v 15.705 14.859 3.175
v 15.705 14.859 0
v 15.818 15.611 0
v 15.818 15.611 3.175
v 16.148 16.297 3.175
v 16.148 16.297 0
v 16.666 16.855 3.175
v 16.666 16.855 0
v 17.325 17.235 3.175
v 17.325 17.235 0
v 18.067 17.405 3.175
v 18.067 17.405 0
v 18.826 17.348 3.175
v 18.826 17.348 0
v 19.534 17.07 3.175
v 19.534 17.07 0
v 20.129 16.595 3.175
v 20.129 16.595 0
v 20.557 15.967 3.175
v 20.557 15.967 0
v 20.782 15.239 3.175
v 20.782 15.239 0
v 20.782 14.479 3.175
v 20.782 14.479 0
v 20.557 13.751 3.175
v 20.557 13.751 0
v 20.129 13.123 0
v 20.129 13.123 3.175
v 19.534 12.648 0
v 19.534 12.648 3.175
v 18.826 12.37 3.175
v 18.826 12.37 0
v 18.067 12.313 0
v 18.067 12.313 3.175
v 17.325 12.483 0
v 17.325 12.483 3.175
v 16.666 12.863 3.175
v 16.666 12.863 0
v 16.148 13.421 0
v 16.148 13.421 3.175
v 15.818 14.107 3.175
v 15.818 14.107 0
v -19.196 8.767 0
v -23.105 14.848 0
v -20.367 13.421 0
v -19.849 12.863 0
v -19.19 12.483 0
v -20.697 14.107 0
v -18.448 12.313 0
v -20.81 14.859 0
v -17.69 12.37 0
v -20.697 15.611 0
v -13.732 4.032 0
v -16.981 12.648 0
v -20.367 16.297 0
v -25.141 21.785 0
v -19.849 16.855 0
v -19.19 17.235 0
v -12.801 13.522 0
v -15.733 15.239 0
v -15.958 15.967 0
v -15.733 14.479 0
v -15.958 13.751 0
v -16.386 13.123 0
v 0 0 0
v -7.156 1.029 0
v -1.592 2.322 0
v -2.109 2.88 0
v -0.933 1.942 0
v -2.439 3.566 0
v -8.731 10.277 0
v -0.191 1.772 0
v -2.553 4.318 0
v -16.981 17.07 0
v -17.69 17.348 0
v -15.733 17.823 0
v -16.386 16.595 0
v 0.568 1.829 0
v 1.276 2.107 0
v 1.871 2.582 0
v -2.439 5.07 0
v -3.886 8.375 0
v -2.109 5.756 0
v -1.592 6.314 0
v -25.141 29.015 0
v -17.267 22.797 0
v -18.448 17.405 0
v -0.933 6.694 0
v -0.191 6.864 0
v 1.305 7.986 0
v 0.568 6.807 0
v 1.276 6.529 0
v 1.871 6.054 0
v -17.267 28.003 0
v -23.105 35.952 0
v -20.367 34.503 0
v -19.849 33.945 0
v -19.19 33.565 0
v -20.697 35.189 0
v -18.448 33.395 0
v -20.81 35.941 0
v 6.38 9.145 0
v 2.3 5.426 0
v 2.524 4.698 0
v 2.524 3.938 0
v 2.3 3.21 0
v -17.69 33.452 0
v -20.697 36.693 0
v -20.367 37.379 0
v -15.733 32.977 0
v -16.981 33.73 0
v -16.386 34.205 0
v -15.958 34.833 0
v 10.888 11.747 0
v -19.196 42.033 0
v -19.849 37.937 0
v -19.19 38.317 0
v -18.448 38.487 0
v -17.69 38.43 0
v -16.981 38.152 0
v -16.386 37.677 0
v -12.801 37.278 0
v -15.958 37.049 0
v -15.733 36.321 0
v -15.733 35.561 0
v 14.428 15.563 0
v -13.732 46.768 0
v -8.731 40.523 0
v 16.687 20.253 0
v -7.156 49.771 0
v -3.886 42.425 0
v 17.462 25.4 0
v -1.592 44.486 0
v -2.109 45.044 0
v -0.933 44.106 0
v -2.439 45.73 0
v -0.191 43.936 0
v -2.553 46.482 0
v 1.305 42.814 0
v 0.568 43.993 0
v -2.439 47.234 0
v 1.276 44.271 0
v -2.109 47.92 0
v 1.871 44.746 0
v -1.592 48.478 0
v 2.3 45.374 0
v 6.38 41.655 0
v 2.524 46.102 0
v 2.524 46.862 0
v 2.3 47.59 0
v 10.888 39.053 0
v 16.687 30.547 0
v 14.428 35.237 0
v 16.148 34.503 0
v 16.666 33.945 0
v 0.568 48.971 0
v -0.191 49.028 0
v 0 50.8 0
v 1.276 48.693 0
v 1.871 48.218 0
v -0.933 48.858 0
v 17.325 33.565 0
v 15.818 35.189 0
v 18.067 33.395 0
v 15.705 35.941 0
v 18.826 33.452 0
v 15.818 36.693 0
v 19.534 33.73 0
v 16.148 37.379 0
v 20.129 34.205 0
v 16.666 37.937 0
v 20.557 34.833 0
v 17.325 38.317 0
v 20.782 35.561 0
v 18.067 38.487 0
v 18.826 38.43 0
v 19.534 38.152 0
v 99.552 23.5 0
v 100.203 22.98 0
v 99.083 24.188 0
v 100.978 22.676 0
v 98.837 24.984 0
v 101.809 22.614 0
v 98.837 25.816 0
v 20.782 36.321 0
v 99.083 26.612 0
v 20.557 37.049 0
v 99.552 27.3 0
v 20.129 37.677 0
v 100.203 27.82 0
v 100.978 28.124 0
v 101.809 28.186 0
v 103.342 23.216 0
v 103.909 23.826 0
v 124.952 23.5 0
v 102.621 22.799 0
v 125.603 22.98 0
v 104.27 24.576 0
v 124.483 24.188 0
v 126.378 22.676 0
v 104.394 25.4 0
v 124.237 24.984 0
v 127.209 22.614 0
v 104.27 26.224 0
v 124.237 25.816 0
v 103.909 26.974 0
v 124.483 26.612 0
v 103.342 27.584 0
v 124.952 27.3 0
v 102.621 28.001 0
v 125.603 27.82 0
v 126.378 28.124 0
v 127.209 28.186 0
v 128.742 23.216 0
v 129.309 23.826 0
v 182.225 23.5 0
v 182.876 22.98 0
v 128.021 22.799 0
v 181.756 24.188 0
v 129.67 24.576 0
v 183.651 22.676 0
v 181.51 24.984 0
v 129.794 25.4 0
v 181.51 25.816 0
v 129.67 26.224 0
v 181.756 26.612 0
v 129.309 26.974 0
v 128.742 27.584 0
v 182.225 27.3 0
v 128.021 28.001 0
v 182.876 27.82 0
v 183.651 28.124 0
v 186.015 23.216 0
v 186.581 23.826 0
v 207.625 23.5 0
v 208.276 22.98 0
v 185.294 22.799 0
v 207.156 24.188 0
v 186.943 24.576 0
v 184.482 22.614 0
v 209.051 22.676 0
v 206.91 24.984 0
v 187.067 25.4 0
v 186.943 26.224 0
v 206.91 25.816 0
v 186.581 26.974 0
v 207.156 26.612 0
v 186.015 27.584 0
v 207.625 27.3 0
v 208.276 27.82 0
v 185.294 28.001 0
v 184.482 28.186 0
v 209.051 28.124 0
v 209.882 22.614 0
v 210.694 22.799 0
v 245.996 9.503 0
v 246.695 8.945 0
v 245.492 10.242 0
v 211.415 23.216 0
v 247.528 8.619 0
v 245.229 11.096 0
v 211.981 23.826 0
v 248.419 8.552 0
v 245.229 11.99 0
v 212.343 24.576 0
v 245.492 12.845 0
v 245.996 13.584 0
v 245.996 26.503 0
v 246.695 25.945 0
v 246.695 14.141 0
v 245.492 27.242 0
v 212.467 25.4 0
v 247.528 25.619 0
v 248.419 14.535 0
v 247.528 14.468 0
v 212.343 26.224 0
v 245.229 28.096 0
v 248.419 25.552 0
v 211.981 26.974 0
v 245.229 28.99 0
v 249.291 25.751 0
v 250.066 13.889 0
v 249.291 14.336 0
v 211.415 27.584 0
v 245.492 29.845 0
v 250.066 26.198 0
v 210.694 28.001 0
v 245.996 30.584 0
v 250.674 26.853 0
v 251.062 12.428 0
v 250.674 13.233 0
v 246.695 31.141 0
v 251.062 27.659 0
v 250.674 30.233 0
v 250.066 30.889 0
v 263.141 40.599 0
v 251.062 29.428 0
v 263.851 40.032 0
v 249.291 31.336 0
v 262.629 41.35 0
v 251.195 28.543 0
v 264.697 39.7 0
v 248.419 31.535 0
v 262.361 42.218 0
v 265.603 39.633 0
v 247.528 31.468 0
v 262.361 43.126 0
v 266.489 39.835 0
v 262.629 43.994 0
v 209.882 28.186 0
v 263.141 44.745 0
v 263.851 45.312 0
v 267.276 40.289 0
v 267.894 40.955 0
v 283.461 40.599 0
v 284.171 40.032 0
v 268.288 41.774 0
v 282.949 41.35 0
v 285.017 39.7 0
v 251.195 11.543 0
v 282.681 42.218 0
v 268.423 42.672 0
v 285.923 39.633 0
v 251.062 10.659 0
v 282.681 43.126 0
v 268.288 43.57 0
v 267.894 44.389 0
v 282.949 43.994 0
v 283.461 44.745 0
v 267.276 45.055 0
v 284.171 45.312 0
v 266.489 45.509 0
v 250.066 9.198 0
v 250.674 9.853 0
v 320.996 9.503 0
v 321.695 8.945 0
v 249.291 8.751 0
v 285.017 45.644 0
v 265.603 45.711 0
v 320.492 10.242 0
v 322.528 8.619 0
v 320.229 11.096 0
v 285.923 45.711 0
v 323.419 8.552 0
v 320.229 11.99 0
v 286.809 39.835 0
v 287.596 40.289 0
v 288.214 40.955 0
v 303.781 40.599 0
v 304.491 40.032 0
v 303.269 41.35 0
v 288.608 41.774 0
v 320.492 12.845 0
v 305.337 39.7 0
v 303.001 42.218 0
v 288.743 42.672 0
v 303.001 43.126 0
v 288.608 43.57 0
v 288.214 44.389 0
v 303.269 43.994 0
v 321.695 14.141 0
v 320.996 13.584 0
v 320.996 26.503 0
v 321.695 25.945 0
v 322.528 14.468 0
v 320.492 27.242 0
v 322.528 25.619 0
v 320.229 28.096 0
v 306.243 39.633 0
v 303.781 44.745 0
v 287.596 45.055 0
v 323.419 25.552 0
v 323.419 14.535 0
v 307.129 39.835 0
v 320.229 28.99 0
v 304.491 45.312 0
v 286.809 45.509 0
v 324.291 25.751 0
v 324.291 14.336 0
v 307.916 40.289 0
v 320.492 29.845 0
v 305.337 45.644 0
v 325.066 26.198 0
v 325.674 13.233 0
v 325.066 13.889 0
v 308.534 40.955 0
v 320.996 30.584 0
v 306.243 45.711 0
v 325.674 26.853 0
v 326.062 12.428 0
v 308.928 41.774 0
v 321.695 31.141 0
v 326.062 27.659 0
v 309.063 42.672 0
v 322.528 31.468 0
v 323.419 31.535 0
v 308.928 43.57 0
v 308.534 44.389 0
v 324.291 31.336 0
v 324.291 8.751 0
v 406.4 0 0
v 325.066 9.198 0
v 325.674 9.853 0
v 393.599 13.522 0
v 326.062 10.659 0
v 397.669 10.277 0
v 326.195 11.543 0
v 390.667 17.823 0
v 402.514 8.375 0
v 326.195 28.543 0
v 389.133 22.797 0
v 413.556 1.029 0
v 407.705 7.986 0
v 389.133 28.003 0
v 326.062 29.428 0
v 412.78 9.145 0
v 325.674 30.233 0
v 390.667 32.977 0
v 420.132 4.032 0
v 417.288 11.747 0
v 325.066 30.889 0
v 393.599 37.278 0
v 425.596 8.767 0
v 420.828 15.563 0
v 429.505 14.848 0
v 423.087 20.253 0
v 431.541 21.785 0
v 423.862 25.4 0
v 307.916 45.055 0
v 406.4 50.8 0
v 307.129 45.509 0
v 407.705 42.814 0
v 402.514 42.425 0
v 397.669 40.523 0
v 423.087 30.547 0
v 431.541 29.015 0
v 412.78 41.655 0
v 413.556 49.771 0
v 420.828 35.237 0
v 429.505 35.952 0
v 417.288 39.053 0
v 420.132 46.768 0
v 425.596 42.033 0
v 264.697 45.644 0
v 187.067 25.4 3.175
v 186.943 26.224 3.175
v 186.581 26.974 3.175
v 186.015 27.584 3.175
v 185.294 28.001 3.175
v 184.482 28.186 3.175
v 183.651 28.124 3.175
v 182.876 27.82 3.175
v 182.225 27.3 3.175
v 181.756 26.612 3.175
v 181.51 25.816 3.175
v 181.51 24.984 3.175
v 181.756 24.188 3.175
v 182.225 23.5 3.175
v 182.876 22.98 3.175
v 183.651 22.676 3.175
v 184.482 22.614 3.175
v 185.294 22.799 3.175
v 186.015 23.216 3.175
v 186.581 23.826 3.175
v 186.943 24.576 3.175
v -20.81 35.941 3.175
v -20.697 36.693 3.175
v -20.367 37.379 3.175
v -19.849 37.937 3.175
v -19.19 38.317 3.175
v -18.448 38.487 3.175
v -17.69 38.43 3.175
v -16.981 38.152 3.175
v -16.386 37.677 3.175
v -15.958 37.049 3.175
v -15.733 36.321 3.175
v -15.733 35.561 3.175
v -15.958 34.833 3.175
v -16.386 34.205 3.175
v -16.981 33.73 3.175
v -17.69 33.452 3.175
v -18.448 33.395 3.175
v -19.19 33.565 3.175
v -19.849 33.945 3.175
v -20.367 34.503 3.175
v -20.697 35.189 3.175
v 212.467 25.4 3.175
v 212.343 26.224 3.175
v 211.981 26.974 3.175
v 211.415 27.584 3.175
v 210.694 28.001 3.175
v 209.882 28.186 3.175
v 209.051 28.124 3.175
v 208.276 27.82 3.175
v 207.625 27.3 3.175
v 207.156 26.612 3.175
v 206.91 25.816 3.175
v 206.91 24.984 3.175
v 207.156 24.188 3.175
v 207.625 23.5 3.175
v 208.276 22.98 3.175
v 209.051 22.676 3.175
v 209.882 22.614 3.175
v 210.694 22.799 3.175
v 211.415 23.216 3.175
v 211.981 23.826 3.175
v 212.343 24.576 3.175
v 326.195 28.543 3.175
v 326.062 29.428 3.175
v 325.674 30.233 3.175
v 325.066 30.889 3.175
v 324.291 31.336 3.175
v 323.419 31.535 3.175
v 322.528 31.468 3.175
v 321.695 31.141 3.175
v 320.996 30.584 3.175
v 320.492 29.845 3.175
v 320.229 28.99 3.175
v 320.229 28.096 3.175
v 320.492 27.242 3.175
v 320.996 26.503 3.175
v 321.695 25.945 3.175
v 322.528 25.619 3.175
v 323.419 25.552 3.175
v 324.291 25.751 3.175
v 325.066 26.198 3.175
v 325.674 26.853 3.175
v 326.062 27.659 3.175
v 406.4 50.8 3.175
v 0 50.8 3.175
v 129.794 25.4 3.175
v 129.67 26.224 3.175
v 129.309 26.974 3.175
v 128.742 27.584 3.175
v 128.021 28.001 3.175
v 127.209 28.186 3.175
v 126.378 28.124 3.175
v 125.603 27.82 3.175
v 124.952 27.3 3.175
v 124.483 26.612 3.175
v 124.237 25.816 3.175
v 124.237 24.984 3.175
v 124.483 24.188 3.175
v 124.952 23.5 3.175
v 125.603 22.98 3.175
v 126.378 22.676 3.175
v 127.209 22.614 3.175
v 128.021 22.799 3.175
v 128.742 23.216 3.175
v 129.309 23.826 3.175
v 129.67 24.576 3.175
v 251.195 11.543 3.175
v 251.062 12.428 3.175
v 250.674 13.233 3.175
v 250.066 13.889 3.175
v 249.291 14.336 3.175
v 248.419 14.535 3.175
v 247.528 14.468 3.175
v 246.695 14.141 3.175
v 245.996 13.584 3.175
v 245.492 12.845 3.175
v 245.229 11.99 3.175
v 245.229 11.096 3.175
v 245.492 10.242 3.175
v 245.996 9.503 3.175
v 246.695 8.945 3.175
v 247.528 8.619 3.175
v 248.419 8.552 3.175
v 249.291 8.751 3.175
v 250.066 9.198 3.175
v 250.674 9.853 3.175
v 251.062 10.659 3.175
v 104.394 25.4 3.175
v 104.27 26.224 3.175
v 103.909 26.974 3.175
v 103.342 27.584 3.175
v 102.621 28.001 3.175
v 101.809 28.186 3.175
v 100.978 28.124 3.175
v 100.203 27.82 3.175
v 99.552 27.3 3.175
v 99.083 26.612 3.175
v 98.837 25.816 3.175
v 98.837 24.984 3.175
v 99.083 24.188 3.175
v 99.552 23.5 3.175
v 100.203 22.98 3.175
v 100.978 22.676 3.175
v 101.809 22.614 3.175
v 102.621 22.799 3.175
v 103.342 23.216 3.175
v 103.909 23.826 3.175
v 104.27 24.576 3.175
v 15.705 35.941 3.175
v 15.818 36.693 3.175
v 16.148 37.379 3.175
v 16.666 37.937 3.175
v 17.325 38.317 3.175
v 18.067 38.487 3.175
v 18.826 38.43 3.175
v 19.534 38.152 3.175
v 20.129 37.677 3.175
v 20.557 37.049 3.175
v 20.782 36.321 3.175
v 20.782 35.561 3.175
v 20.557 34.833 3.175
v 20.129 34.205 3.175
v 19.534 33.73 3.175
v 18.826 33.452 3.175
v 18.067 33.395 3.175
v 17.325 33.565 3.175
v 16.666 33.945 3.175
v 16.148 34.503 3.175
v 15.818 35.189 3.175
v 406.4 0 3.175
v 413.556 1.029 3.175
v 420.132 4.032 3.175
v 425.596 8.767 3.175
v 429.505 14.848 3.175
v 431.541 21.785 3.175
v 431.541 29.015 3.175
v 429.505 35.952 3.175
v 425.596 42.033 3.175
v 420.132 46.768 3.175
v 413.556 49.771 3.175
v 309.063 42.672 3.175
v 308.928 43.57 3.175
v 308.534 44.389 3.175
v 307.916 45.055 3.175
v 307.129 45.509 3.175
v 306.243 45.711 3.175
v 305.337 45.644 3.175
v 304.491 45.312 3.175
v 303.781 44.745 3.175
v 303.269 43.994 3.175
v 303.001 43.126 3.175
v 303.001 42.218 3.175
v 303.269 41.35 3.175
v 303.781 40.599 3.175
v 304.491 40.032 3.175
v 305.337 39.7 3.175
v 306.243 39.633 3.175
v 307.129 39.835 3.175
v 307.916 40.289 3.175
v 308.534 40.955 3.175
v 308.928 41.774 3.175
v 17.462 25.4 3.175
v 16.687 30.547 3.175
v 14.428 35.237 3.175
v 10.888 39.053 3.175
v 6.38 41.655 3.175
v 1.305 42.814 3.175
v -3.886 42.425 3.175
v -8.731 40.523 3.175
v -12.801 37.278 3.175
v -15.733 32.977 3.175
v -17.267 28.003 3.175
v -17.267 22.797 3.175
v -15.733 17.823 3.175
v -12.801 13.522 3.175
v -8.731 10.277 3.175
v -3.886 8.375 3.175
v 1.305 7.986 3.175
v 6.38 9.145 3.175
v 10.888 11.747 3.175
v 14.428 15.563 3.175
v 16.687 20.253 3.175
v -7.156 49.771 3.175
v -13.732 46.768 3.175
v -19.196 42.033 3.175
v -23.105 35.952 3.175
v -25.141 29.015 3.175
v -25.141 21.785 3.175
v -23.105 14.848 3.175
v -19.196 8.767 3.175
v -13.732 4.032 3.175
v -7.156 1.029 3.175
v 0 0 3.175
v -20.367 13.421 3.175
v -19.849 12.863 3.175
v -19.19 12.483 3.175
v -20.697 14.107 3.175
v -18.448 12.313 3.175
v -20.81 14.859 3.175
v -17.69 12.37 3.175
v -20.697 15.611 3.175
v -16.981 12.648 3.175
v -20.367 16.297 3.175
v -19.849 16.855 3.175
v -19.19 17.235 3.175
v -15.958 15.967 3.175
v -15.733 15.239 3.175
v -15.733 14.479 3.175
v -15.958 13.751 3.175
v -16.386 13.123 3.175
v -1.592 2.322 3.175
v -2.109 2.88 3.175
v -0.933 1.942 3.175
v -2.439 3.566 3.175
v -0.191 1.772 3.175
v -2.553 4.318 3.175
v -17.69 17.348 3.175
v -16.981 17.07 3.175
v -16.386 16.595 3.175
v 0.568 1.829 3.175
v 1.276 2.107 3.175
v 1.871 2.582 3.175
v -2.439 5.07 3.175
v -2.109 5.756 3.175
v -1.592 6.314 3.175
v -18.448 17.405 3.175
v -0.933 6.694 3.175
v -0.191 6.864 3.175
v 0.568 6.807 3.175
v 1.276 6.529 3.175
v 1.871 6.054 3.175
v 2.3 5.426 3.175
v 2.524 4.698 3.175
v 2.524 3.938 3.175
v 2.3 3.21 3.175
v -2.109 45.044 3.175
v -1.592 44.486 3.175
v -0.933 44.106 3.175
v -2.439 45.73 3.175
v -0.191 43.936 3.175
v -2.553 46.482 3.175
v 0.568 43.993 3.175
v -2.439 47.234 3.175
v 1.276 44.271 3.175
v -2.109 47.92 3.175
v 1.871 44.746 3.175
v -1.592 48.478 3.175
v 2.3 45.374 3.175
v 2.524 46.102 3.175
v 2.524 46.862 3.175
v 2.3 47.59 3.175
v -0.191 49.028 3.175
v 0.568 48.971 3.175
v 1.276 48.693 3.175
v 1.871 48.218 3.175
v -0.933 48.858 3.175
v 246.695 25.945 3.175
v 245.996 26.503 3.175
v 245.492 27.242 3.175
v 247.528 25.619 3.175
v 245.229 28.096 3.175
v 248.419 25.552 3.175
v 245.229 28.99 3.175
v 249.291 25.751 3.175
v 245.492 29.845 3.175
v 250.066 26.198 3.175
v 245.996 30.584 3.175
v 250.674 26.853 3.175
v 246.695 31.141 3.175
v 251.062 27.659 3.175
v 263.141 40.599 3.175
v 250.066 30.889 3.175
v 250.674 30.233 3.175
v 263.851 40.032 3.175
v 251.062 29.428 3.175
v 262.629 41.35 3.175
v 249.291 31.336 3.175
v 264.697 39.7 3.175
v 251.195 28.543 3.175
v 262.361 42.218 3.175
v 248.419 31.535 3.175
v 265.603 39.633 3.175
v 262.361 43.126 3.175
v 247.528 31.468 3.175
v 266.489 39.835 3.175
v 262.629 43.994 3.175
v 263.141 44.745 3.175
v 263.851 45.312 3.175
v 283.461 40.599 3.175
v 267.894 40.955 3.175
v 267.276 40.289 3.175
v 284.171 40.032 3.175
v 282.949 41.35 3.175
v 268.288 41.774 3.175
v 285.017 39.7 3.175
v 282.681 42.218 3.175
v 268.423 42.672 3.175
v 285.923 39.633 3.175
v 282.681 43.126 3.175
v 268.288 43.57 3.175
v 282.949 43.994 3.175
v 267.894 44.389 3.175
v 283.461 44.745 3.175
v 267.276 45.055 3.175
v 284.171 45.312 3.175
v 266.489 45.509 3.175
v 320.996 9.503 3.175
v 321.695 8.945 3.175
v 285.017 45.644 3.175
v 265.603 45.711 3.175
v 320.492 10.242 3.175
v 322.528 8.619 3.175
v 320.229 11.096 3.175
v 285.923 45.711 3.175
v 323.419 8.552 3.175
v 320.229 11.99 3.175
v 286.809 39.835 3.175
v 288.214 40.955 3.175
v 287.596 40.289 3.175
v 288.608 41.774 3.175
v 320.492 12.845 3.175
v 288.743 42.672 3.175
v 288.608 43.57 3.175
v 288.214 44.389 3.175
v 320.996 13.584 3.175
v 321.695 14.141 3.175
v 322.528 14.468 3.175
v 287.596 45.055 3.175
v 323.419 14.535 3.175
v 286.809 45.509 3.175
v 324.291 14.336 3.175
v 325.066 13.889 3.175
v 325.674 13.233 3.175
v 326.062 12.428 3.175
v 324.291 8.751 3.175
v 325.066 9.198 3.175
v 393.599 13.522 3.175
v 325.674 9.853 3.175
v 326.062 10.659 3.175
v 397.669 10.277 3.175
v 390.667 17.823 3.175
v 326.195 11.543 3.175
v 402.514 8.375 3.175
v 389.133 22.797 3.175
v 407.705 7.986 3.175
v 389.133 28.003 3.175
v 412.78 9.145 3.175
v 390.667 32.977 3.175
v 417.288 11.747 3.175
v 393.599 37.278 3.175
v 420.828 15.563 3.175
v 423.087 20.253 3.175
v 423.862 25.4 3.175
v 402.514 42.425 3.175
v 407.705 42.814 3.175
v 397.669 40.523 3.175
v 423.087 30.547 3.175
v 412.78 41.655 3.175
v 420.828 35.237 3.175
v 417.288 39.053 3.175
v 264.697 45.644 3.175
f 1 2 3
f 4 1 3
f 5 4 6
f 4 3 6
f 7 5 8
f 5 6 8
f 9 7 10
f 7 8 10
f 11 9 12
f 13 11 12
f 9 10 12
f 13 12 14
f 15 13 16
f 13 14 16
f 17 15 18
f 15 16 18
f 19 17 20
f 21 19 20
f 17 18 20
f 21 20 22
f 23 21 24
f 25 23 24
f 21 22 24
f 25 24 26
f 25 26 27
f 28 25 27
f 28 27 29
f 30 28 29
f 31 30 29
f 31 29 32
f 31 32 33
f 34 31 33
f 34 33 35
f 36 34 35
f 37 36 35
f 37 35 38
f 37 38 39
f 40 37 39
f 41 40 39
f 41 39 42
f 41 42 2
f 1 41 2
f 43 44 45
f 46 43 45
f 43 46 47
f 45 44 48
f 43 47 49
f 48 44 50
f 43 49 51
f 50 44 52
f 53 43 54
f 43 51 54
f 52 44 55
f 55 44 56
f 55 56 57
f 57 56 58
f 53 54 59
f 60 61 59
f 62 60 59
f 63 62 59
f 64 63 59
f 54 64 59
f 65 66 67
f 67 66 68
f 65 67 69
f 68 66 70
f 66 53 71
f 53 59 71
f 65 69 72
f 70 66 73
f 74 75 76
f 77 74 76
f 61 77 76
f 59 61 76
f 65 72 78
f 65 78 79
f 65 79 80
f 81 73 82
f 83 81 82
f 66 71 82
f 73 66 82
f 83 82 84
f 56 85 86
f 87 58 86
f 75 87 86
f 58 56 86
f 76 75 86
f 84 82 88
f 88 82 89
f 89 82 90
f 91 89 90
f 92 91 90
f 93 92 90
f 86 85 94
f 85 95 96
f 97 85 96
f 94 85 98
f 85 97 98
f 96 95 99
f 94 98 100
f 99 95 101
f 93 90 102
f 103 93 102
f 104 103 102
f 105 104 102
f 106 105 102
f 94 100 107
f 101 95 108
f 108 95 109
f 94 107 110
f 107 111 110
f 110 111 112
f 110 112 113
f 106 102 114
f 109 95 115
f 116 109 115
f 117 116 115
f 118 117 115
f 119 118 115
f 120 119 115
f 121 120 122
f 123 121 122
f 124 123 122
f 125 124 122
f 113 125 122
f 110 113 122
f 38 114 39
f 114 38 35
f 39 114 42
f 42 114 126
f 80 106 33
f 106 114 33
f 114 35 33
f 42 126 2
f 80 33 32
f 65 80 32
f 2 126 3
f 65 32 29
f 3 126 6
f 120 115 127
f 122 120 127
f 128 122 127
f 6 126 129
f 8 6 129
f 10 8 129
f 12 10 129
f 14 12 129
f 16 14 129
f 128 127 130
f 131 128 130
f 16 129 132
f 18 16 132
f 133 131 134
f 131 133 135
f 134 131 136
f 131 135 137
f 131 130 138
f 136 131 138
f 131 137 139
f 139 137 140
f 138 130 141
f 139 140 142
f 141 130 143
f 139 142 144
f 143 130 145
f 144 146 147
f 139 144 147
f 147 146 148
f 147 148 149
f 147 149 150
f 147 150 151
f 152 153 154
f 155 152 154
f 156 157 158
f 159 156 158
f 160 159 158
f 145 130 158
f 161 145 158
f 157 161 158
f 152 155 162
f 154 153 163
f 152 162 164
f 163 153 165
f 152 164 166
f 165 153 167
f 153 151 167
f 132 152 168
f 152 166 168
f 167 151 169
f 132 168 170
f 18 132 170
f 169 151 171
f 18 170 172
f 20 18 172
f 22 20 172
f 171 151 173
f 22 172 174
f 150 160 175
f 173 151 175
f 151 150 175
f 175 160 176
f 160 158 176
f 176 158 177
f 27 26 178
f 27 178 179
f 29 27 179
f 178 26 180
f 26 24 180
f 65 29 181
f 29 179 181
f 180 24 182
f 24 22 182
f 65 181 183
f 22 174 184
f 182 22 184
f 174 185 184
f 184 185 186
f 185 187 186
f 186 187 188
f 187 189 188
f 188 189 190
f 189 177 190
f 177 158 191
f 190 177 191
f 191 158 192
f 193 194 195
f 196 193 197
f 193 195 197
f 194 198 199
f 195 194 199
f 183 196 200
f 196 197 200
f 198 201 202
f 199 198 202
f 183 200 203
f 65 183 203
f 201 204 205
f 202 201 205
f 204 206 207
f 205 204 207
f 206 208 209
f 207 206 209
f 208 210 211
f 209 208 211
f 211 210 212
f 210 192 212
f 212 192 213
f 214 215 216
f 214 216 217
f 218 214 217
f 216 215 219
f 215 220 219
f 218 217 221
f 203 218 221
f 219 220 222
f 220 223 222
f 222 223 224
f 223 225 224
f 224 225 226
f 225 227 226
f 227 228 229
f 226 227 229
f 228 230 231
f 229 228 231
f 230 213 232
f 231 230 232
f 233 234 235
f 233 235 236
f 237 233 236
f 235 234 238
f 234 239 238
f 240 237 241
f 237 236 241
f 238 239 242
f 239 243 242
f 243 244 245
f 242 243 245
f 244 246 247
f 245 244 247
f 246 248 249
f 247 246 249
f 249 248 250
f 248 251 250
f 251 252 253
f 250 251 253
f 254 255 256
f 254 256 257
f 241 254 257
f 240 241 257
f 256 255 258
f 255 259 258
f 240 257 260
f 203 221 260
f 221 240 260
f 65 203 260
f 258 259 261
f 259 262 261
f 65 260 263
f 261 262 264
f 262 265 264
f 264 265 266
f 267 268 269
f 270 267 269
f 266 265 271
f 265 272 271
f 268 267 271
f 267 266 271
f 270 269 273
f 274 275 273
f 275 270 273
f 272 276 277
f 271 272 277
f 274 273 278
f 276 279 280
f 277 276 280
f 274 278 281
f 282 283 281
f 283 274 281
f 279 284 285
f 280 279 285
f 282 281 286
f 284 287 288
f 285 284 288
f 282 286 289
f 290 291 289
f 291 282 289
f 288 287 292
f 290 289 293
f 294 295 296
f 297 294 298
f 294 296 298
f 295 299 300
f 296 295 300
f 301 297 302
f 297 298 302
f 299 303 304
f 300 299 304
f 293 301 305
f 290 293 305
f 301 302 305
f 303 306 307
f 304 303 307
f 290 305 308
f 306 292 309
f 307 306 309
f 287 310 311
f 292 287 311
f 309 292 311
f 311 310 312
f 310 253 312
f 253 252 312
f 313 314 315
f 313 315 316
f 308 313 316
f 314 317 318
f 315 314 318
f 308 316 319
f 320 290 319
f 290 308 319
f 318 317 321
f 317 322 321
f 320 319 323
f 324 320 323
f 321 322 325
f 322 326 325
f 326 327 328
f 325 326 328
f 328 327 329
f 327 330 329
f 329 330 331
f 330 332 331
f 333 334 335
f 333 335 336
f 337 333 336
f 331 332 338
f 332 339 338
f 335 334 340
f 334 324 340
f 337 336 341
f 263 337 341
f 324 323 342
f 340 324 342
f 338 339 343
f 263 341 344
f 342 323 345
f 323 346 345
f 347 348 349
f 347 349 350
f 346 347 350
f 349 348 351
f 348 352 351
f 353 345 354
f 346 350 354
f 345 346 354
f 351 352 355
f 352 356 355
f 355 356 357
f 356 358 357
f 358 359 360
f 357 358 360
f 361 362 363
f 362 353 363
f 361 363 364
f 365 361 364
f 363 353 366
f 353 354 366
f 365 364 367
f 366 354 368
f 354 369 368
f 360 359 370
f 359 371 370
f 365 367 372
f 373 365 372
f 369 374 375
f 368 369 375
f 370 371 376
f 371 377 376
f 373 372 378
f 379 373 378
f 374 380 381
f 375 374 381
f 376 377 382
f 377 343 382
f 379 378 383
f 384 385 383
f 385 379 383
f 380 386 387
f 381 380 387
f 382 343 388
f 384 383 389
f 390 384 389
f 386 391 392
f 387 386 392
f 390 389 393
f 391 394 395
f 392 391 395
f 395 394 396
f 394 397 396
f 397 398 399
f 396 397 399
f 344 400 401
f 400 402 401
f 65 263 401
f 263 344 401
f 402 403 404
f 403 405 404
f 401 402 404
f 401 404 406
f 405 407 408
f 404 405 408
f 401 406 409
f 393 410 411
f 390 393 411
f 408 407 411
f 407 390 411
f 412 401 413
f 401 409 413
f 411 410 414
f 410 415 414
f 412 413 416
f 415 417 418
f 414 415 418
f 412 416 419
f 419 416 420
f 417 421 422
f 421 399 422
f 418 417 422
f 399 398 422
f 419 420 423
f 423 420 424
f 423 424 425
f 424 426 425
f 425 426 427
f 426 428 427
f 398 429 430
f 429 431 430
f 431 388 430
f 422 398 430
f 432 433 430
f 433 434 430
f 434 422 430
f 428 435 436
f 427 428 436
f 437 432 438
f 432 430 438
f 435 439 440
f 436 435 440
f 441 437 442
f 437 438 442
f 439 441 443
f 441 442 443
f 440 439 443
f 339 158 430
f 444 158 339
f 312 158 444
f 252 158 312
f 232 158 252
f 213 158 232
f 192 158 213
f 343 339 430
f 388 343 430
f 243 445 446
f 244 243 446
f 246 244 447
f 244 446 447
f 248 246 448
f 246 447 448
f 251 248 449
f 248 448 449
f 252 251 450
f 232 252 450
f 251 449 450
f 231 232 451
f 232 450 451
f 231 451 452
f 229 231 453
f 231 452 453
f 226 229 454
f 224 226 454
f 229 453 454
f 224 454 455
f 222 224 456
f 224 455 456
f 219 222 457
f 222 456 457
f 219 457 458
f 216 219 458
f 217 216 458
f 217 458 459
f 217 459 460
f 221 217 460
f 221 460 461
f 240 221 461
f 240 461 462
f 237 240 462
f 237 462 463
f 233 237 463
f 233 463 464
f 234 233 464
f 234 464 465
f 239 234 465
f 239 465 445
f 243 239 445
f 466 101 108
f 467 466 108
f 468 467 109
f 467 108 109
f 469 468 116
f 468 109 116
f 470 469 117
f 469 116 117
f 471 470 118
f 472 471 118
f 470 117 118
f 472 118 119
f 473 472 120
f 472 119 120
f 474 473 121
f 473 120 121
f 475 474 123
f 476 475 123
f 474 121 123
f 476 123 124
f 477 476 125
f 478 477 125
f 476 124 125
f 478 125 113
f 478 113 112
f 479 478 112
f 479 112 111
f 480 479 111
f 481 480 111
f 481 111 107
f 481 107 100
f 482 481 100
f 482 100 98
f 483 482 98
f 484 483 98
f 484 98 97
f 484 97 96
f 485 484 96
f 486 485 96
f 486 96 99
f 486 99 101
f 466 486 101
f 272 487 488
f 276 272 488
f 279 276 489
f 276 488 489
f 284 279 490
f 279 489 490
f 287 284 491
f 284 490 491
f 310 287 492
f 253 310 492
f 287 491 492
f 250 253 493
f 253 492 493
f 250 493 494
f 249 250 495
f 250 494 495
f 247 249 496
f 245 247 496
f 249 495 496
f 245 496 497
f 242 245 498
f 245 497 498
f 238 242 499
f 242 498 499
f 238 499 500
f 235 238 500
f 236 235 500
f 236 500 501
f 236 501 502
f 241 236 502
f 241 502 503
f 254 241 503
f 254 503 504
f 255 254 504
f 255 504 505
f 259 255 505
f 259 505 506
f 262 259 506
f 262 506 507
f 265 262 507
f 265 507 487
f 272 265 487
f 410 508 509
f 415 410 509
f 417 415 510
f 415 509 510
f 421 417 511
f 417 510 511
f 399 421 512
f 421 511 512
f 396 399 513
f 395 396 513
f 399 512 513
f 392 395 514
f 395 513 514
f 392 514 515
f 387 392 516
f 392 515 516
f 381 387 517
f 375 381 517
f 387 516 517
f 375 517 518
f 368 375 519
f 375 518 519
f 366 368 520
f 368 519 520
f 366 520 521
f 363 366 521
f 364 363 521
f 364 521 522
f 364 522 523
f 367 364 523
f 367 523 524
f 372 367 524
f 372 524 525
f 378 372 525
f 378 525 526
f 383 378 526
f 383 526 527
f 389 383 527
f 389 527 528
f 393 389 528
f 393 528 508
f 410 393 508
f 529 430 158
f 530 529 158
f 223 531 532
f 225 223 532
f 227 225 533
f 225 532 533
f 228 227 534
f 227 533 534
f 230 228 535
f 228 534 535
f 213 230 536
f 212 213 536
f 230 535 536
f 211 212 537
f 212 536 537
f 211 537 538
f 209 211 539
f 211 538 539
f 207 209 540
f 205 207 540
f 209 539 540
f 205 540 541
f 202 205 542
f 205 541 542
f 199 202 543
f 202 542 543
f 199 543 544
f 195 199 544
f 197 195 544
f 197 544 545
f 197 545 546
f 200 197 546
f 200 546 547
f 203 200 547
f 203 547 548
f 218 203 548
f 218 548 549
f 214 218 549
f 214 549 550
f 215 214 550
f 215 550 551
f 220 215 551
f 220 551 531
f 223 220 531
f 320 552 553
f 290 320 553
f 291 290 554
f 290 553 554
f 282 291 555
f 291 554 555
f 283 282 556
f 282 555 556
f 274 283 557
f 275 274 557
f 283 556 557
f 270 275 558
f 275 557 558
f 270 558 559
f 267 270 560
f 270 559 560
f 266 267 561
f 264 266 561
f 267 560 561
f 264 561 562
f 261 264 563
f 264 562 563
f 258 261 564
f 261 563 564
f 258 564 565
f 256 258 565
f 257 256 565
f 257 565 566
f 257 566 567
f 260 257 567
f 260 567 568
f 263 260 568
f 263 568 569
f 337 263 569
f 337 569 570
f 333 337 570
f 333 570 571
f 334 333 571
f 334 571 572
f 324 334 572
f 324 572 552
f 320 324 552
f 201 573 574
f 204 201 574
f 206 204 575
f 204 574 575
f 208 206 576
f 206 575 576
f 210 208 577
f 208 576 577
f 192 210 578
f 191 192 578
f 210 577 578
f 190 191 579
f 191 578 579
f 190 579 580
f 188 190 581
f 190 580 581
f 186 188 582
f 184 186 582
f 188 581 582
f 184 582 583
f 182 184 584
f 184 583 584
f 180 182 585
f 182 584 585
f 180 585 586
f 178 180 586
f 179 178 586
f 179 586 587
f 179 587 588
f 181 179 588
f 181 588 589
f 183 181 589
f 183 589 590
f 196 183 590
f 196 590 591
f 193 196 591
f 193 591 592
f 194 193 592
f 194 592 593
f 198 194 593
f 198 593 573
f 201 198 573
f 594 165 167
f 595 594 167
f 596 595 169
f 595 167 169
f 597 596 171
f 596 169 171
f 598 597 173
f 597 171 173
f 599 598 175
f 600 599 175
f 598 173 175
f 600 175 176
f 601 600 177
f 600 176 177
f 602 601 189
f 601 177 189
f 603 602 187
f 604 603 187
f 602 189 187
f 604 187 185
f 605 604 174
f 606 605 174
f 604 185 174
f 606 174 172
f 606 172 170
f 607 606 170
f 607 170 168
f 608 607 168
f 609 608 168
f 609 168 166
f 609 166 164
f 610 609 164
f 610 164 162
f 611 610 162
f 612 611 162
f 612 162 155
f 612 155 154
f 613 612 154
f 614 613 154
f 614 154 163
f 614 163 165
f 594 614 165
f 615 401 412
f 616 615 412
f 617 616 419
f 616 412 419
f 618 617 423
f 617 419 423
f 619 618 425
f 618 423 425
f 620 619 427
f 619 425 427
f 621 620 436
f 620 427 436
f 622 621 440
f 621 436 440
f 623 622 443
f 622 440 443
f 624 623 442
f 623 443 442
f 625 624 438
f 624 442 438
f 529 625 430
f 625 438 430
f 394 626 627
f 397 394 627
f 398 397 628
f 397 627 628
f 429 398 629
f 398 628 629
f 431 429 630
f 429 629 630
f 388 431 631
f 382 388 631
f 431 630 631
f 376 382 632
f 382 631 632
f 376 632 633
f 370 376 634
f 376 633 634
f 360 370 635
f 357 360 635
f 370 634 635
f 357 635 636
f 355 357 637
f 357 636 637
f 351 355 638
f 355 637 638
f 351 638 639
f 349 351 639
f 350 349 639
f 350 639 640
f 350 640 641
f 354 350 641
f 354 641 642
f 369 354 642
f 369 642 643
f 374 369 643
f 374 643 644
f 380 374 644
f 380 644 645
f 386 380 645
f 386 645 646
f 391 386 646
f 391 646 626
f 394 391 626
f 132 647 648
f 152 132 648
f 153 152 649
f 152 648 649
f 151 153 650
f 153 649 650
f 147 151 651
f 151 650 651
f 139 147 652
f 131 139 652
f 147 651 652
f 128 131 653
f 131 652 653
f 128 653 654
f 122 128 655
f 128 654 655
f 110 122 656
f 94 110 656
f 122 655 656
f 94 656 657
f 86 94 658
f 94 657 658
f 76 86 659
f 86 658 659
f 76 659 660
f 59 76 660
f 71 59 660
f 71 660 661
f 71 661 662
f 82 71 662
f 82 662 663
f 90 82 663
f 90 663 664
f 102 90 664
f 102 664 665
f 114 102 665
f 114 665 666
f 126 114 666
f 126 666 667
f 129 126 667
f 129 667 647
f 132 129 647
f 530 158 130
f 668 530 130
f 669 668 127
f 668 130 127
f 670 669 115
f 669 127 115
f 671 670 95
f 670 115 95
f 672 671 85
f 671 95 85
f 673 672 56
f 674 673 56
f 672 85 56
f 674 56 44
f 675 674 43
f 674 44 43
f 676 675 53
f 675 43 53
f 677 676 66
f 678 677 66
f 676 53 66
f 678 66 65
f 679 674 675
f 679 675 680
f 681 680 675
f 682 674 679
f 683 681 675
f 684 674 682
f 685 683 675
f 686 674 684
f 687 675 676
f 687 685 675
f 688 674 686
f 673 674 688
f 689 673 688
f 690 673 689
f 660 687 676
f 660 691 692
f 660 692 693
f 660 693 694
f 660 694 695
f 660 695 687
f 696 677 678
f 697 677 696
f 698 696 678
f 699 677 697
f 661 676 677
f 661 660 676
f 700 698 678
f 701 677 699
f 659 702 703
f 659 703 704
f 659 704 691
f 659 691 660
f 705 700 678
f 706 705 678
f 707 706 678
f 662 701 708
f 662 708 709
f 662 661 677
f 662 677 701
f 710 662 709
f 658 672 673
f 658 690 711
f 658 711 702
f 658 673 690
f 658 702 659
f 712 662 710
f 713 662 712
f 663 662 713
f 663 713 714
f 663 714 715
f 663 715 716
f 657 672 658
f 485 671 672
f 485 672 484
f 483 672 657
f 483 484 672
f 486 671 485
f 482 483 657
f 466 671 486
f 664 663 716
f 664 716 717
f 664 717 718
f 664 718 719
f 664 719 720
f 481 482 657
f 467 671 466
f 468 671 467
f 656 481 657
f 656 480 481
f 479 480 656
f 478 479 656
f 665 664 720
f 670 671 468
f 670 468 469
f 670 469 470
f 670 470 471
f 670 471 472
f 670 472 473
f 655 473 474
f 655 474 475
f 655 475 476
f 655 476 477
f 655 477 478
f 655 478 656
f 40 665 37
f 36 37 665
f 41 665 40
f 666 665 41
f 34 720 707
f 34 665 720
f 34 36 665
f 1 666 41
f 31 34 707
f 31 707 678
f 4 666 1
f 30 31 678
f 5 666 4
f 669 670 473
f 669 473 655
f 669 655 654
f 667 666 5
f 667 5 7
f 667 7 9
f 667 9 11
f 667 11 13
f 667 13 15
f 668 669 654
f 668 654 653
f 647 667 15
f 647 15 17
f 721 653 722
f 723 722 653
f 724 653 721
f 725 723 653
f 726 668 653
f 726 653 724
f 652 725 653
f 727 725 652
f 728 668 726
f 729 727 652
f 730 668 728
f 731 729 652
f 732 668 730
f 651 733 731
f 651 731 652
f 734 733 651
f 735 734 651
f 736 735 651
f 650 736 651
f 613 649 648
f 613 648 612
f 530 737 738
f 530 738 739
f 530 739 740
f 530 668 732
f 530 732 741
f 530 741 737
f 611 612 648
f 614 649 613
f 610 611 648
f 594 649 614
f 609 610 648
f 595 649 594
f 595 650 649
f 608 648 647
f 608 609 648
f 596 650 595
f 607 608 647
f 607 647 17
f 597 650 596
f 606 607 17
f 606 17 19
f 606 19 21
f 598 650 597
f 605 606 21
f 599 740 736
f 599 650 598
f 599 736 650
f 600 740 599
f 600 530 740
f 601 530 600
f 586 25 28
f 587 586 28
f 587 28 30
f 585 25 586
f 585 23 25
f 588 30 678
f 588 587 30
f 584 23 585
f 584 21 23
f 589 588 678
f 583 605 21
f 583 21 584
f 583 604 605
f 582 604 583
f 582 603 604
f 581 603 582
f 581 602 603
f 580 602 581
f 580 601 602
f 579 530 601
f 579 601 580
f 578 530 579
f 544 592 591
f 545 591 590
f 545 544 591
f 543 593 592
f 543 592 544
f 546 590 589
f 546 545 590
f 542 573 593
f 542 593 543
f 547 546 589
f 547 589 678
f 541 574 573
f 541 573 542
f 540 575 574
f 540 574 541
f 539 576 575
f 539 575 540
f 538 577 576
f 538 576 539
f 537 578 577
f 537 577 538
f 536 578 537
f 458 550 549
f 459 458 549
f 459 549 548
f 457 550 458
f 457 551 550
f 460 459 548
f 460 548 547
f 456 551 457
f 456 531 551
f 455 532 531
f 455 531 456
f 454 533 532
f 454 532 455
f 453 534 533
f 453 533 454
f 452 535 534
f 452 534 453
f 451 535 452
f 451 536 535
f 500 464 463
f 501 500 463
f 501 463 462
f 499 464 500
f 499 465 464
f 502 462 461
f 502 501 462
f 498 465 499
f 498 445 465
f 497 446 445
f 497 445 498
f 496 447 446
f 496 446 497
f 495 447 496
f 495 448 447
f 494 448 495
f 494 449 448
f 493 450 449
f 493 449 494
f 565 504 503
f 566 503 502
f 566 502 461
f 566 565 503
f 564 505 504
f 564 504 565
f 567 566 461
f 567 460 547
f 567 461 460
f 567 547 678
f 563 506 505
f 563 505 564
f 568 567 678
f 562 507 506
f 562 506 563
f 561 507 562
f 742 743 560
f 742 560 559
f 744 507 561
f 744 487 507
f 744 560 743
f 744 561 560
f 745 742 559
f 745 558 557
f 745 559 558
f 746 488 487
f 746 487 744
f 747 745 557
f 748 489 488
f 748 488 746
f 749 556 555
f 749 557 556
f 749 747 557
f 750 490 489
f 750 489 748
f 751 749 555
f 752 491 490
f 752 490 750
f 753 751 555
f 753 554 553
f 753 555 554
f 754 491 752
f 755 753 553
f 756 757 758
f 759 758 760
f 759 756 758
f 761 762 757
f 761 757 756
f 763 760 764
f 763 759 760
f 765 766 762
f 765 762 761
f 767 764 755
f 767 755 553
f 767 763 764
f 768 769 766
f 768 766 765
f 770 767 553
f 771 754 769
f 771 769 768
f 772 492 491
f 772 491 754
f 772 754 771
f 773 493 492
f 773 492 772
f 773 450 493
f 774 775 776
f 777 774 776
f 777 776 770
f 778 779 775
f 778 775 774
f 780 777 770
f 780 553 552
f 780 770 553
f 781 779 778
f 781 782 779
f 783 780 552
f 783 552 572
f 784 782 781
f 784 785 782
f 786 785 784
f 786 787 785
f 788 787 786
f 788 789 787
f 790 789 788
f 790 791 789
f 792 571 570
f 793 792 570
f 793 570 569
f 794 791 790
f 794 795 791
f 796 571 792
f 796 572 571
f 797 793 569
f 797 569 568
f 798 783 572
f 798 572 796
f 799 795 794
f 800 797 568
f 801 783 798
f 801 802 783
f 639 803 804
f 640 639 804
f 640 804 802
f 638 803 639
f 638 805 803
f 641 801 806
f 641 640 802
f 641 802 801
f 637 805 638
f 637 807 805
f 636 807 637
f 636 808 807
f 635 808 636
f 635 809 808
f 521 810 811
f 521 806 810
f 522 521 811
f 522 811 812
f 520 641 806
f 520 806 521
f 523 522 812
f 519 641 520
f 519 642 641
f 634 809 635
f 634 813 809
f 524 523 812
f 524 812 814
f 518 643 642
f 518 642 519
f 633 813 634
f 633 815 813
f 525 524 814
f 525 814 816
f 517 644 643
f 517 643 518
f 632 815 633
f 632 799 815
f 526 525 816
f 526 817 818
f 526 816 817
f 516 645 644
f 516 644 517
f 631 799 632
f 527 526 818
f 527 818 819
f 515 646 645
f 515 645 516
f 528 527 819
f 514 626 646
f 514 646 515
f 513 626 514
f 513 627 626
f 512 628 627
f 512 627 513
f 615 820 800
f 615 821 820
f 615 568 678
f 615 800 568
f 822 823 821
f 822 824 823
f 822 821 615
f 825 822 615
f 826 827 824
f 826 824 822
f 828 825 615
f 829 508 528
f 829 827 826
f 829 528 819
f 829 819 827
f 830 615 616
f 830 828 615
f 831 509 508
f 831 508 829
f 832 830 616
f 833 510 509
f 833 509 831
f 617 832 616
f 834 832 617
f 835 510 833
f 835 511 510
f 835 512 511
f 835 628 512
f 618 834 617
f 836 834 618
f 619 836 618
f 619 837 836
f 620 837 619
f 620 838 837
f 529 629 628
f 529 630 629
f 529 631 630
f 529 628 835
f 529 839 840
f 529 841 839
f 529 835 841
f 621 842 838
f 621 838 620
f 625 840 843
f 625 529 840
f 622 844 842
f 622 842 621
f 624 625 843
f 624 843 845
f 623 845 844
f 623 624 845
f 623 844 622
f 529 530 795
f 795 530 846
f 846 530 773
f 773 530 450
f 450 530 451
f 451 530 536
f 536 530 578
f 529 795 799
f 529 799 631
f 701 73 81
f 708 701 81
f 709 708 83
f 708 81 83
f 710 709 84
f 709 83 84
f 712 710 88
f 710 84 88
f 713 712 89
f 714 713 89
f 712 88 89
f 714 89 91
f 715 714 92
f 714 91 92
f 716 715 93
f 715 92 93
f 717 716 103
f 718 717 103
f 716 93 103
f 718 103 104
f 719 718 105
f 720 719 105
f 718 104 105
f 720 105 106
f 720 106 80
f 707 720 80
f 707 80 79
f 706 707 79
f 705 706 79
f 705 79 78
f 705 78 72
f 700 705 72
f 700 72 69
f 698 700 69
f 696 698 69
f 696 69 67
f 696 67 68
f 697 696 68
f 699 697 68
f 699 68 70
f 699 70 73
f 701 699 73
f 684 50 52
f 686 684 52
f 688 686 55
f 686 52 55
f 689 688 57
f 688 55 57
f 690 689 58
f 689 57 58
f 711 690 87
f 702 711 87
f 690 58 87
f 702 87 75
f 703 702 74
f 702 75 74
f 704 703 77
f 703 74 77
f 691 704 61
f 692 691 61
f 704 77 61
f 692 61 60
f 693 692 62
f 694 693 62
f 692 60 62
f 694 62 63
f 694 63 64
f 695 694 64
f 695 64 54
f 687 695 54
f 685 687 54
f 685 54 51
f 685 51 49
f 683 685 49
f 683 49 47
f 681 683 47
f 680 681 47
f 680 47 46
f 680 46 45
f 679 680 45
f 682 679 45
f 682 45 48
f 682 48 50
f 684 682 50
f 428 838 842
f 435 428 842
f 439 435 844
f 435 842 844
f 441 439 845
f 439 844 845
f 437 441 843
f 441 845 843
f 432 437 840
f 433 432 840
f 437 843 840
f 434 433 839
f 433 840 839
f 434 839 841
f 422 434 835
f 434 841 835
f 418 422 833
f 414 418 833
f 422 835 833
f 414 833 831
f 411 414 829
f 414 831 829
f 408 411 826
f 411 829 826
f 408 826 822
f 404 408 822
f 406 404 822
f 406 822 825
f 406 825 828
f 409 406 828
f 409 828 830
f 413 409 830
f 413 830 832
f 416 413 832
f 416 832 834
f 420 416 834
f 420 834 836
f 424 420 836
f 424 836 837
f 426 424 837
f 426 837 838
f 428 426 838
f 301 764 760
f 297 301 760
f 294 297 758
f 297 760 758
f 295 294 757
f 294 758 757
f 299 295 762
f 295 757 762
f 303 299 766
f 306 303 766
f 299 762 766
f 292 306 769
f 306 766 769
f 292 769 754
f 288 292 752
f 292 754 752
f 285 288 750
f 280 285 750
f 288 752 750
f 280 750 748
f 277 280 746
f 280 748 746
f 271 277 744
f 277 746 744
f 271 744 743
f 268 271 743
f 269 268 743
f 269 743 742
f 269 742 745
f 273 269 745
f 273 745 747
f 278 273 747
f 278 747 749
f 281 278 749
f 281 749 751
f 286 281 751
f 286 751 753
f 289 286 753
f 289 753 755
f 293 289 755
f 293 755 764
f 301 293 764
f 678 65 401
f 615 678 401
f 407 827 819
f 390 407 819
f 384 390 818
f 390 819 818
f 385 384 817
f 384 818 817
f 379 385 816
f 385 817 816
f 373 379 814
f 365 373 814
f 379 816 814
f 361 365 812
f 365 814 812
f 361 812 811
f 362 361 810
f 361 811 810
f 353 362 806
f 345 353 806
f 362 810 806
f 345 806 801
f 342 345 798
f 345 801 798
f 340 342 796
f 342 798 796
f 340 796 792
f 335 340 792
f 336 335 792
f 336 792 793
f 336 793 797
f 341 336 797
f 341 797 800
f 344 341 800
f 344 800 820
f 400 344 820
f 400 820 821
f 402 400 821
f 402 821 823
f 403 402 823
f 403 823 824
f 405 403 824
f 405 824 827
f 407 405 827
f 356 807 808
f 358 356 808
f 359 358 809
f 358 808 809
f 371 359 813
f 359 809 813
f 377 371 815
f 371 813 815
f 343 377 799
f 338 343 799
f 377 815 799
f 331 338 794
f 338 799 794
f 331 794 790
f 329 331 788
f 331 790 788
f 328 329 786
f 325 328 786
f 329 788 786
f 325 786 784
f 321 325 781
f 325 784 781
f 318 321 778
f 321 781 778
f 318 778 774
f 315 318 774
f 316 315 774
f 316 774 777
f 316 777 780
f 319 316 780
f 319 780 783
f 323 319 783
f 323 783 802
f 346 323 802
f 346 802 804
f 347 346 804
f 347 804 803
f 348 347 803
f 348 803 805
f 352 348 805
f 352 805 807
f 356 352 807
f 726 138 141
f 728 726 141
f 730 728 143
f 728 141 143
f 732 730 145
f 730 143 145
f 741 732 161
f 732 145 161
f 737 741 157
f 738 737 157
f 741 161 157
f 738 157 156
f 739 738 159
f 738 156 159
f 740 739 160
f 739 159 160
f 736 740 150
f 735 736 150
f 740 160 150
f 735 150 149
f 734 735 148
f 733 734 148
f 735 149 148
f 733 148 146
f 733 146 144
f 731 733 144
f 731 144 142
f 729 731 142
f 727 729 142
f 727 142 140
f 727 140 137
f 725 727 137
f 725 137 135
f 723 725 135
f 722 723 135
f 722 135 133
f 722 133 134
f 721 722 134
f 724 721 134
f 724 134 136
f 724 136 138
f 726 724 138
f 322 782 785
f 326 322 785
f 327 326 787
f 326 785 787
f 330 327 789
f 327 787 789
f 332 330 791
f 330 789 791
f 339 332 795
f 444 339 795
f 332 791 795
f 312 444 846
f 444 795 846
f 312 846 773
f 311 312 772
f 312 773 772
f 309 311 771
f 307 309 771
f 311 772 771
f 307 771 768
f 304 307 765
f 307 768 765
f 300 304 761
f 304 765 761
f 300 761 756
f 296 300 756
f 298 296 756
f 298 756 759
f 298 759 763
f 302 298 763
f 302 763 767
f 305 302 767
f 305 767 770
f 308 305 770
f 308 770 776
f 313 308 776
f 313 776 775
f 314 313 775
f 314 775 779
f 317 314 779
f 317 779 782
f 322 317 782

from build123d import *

# Parameters (mm, degrees)
BOSS_EXTRUDE1_DEPTH    = 3.175
SKETCH2_R              = 17.4625
CUT_EXTRUDE1_DEPTH     = 435.789559011
F_10_CLEARANCE_HOLE1_D = 5.1054
SKETCH4_R              = 2.794
CUT_EXTRUDE2_DEPTH     = 435.789559011
SKETCH7_R              = 3.048
CUT_EXTRUDE3_DEPTH     = 435.789559011
SKETCH8_R              = 3
CUT_EXTRUDE4_DEPTH     = 435.789559011


with BuildPart() as part:
    # Sketch1 → Boss-Extrude1 (new body)
    with BuildSketch(Plane.XY):
        with BuildLine():
            Line((0, 0), (406.4, 0))
            ThreePointArc((406.4, 0), (431.8, 25.4), (406.4, 50.8))
            Line((406.4, 50.8), (0, 50.8))
            ThreePointArc((0, 50.8), (-25.4, 25.4), (0, 0))
        make_face()
    extrude(amount=BOSS_EXTRUDE1_DEPTH)

    # Sketch2 → Cut-Extrude1 (cut, through all)
    with BuildSketch(Plane.XY.offset(3.175)):
        with Locations((0, 25.4)):
            Circle(SKETCH2_R)
        with Locations((406.4, 25.4)):
            Circle(SKETCH2_R)
    extrude(amount=-CUT_EXTRUDE1_DEPTH, mode=Mode.SUBTRACT)

    # #10 Clearance Hole1 (through all)
    with Locations(Plane(origin=(18.257547563, 35.941, 3.175), x_dir=(1, 0, 0), z_dir=(0, 0, 1))):
        with Locations((0, 0), (0, -21.082), (-18.257547563, -31.623), (-36.515095126, -21.082), (-36.515095126, 0), (-18.257547563, 10.541)):
            Hole(F_10_CLEARANCE_HOLE1_D / 2)

    # Sketch4 → Cut-Extrude2 (cut, through all)
    with BuildSketch(Plane.XY.offset(3.175)):
        with Locations((101.6, 25.4)):
            Circle(SKETCH4_R)
        with Locations((127, 25.4)):
            Circle(SKETCH4_R)
        with Locations((184.272931293, 25.4)):
            Circle(SKETCH4_R)
        with Locations((209.672931293, 25.4)):
            Circle(SKETCH4_R)
    extrude(amount=-CUT_EXTRUDE2_DEPTH, mode=Mode.SUBTRACT)

    # Sketch7 → Cut-Extrude3 (cut, through all)
    with BuildSketch(Plane.XY.offset(3.175)):
        with Locations((306.015176825, 42.672)):
            Circle(SKETCH7_R)
        with Locations((285.695176825, 42.672)):
            Circle(SKETCH7_R)
        with Locations((265.375176825, 42.672)):
            Circle(SKETCH7_R)
    extrude(amount=-CUT_EXTRUDE3_DEPTH, mode=Mode.SUBTRACT)

    # Sketch8 → Cut-Extrude4 (cut, through all)
    with BuildSketch(Plane.XY.offset(3.175)):
        with Locations((323.195176825, 11.543289628)):
            Circle(SKETCH8_R)
        with Locations((323.195176825, 28.543289628)):
            Circle(SKETCH8_R)
        with Locations((248.195176825, 11.543289628)):
            Circle(SKETCH8_R)
        with Locations((248.195176825, 28.543289628)):
            Circle(SKETCH8_R)
    extrude(amount=-CUT_EXTRUDE4_DEPTH, mode=Mode.SUBTRACT)


solid = part.part
